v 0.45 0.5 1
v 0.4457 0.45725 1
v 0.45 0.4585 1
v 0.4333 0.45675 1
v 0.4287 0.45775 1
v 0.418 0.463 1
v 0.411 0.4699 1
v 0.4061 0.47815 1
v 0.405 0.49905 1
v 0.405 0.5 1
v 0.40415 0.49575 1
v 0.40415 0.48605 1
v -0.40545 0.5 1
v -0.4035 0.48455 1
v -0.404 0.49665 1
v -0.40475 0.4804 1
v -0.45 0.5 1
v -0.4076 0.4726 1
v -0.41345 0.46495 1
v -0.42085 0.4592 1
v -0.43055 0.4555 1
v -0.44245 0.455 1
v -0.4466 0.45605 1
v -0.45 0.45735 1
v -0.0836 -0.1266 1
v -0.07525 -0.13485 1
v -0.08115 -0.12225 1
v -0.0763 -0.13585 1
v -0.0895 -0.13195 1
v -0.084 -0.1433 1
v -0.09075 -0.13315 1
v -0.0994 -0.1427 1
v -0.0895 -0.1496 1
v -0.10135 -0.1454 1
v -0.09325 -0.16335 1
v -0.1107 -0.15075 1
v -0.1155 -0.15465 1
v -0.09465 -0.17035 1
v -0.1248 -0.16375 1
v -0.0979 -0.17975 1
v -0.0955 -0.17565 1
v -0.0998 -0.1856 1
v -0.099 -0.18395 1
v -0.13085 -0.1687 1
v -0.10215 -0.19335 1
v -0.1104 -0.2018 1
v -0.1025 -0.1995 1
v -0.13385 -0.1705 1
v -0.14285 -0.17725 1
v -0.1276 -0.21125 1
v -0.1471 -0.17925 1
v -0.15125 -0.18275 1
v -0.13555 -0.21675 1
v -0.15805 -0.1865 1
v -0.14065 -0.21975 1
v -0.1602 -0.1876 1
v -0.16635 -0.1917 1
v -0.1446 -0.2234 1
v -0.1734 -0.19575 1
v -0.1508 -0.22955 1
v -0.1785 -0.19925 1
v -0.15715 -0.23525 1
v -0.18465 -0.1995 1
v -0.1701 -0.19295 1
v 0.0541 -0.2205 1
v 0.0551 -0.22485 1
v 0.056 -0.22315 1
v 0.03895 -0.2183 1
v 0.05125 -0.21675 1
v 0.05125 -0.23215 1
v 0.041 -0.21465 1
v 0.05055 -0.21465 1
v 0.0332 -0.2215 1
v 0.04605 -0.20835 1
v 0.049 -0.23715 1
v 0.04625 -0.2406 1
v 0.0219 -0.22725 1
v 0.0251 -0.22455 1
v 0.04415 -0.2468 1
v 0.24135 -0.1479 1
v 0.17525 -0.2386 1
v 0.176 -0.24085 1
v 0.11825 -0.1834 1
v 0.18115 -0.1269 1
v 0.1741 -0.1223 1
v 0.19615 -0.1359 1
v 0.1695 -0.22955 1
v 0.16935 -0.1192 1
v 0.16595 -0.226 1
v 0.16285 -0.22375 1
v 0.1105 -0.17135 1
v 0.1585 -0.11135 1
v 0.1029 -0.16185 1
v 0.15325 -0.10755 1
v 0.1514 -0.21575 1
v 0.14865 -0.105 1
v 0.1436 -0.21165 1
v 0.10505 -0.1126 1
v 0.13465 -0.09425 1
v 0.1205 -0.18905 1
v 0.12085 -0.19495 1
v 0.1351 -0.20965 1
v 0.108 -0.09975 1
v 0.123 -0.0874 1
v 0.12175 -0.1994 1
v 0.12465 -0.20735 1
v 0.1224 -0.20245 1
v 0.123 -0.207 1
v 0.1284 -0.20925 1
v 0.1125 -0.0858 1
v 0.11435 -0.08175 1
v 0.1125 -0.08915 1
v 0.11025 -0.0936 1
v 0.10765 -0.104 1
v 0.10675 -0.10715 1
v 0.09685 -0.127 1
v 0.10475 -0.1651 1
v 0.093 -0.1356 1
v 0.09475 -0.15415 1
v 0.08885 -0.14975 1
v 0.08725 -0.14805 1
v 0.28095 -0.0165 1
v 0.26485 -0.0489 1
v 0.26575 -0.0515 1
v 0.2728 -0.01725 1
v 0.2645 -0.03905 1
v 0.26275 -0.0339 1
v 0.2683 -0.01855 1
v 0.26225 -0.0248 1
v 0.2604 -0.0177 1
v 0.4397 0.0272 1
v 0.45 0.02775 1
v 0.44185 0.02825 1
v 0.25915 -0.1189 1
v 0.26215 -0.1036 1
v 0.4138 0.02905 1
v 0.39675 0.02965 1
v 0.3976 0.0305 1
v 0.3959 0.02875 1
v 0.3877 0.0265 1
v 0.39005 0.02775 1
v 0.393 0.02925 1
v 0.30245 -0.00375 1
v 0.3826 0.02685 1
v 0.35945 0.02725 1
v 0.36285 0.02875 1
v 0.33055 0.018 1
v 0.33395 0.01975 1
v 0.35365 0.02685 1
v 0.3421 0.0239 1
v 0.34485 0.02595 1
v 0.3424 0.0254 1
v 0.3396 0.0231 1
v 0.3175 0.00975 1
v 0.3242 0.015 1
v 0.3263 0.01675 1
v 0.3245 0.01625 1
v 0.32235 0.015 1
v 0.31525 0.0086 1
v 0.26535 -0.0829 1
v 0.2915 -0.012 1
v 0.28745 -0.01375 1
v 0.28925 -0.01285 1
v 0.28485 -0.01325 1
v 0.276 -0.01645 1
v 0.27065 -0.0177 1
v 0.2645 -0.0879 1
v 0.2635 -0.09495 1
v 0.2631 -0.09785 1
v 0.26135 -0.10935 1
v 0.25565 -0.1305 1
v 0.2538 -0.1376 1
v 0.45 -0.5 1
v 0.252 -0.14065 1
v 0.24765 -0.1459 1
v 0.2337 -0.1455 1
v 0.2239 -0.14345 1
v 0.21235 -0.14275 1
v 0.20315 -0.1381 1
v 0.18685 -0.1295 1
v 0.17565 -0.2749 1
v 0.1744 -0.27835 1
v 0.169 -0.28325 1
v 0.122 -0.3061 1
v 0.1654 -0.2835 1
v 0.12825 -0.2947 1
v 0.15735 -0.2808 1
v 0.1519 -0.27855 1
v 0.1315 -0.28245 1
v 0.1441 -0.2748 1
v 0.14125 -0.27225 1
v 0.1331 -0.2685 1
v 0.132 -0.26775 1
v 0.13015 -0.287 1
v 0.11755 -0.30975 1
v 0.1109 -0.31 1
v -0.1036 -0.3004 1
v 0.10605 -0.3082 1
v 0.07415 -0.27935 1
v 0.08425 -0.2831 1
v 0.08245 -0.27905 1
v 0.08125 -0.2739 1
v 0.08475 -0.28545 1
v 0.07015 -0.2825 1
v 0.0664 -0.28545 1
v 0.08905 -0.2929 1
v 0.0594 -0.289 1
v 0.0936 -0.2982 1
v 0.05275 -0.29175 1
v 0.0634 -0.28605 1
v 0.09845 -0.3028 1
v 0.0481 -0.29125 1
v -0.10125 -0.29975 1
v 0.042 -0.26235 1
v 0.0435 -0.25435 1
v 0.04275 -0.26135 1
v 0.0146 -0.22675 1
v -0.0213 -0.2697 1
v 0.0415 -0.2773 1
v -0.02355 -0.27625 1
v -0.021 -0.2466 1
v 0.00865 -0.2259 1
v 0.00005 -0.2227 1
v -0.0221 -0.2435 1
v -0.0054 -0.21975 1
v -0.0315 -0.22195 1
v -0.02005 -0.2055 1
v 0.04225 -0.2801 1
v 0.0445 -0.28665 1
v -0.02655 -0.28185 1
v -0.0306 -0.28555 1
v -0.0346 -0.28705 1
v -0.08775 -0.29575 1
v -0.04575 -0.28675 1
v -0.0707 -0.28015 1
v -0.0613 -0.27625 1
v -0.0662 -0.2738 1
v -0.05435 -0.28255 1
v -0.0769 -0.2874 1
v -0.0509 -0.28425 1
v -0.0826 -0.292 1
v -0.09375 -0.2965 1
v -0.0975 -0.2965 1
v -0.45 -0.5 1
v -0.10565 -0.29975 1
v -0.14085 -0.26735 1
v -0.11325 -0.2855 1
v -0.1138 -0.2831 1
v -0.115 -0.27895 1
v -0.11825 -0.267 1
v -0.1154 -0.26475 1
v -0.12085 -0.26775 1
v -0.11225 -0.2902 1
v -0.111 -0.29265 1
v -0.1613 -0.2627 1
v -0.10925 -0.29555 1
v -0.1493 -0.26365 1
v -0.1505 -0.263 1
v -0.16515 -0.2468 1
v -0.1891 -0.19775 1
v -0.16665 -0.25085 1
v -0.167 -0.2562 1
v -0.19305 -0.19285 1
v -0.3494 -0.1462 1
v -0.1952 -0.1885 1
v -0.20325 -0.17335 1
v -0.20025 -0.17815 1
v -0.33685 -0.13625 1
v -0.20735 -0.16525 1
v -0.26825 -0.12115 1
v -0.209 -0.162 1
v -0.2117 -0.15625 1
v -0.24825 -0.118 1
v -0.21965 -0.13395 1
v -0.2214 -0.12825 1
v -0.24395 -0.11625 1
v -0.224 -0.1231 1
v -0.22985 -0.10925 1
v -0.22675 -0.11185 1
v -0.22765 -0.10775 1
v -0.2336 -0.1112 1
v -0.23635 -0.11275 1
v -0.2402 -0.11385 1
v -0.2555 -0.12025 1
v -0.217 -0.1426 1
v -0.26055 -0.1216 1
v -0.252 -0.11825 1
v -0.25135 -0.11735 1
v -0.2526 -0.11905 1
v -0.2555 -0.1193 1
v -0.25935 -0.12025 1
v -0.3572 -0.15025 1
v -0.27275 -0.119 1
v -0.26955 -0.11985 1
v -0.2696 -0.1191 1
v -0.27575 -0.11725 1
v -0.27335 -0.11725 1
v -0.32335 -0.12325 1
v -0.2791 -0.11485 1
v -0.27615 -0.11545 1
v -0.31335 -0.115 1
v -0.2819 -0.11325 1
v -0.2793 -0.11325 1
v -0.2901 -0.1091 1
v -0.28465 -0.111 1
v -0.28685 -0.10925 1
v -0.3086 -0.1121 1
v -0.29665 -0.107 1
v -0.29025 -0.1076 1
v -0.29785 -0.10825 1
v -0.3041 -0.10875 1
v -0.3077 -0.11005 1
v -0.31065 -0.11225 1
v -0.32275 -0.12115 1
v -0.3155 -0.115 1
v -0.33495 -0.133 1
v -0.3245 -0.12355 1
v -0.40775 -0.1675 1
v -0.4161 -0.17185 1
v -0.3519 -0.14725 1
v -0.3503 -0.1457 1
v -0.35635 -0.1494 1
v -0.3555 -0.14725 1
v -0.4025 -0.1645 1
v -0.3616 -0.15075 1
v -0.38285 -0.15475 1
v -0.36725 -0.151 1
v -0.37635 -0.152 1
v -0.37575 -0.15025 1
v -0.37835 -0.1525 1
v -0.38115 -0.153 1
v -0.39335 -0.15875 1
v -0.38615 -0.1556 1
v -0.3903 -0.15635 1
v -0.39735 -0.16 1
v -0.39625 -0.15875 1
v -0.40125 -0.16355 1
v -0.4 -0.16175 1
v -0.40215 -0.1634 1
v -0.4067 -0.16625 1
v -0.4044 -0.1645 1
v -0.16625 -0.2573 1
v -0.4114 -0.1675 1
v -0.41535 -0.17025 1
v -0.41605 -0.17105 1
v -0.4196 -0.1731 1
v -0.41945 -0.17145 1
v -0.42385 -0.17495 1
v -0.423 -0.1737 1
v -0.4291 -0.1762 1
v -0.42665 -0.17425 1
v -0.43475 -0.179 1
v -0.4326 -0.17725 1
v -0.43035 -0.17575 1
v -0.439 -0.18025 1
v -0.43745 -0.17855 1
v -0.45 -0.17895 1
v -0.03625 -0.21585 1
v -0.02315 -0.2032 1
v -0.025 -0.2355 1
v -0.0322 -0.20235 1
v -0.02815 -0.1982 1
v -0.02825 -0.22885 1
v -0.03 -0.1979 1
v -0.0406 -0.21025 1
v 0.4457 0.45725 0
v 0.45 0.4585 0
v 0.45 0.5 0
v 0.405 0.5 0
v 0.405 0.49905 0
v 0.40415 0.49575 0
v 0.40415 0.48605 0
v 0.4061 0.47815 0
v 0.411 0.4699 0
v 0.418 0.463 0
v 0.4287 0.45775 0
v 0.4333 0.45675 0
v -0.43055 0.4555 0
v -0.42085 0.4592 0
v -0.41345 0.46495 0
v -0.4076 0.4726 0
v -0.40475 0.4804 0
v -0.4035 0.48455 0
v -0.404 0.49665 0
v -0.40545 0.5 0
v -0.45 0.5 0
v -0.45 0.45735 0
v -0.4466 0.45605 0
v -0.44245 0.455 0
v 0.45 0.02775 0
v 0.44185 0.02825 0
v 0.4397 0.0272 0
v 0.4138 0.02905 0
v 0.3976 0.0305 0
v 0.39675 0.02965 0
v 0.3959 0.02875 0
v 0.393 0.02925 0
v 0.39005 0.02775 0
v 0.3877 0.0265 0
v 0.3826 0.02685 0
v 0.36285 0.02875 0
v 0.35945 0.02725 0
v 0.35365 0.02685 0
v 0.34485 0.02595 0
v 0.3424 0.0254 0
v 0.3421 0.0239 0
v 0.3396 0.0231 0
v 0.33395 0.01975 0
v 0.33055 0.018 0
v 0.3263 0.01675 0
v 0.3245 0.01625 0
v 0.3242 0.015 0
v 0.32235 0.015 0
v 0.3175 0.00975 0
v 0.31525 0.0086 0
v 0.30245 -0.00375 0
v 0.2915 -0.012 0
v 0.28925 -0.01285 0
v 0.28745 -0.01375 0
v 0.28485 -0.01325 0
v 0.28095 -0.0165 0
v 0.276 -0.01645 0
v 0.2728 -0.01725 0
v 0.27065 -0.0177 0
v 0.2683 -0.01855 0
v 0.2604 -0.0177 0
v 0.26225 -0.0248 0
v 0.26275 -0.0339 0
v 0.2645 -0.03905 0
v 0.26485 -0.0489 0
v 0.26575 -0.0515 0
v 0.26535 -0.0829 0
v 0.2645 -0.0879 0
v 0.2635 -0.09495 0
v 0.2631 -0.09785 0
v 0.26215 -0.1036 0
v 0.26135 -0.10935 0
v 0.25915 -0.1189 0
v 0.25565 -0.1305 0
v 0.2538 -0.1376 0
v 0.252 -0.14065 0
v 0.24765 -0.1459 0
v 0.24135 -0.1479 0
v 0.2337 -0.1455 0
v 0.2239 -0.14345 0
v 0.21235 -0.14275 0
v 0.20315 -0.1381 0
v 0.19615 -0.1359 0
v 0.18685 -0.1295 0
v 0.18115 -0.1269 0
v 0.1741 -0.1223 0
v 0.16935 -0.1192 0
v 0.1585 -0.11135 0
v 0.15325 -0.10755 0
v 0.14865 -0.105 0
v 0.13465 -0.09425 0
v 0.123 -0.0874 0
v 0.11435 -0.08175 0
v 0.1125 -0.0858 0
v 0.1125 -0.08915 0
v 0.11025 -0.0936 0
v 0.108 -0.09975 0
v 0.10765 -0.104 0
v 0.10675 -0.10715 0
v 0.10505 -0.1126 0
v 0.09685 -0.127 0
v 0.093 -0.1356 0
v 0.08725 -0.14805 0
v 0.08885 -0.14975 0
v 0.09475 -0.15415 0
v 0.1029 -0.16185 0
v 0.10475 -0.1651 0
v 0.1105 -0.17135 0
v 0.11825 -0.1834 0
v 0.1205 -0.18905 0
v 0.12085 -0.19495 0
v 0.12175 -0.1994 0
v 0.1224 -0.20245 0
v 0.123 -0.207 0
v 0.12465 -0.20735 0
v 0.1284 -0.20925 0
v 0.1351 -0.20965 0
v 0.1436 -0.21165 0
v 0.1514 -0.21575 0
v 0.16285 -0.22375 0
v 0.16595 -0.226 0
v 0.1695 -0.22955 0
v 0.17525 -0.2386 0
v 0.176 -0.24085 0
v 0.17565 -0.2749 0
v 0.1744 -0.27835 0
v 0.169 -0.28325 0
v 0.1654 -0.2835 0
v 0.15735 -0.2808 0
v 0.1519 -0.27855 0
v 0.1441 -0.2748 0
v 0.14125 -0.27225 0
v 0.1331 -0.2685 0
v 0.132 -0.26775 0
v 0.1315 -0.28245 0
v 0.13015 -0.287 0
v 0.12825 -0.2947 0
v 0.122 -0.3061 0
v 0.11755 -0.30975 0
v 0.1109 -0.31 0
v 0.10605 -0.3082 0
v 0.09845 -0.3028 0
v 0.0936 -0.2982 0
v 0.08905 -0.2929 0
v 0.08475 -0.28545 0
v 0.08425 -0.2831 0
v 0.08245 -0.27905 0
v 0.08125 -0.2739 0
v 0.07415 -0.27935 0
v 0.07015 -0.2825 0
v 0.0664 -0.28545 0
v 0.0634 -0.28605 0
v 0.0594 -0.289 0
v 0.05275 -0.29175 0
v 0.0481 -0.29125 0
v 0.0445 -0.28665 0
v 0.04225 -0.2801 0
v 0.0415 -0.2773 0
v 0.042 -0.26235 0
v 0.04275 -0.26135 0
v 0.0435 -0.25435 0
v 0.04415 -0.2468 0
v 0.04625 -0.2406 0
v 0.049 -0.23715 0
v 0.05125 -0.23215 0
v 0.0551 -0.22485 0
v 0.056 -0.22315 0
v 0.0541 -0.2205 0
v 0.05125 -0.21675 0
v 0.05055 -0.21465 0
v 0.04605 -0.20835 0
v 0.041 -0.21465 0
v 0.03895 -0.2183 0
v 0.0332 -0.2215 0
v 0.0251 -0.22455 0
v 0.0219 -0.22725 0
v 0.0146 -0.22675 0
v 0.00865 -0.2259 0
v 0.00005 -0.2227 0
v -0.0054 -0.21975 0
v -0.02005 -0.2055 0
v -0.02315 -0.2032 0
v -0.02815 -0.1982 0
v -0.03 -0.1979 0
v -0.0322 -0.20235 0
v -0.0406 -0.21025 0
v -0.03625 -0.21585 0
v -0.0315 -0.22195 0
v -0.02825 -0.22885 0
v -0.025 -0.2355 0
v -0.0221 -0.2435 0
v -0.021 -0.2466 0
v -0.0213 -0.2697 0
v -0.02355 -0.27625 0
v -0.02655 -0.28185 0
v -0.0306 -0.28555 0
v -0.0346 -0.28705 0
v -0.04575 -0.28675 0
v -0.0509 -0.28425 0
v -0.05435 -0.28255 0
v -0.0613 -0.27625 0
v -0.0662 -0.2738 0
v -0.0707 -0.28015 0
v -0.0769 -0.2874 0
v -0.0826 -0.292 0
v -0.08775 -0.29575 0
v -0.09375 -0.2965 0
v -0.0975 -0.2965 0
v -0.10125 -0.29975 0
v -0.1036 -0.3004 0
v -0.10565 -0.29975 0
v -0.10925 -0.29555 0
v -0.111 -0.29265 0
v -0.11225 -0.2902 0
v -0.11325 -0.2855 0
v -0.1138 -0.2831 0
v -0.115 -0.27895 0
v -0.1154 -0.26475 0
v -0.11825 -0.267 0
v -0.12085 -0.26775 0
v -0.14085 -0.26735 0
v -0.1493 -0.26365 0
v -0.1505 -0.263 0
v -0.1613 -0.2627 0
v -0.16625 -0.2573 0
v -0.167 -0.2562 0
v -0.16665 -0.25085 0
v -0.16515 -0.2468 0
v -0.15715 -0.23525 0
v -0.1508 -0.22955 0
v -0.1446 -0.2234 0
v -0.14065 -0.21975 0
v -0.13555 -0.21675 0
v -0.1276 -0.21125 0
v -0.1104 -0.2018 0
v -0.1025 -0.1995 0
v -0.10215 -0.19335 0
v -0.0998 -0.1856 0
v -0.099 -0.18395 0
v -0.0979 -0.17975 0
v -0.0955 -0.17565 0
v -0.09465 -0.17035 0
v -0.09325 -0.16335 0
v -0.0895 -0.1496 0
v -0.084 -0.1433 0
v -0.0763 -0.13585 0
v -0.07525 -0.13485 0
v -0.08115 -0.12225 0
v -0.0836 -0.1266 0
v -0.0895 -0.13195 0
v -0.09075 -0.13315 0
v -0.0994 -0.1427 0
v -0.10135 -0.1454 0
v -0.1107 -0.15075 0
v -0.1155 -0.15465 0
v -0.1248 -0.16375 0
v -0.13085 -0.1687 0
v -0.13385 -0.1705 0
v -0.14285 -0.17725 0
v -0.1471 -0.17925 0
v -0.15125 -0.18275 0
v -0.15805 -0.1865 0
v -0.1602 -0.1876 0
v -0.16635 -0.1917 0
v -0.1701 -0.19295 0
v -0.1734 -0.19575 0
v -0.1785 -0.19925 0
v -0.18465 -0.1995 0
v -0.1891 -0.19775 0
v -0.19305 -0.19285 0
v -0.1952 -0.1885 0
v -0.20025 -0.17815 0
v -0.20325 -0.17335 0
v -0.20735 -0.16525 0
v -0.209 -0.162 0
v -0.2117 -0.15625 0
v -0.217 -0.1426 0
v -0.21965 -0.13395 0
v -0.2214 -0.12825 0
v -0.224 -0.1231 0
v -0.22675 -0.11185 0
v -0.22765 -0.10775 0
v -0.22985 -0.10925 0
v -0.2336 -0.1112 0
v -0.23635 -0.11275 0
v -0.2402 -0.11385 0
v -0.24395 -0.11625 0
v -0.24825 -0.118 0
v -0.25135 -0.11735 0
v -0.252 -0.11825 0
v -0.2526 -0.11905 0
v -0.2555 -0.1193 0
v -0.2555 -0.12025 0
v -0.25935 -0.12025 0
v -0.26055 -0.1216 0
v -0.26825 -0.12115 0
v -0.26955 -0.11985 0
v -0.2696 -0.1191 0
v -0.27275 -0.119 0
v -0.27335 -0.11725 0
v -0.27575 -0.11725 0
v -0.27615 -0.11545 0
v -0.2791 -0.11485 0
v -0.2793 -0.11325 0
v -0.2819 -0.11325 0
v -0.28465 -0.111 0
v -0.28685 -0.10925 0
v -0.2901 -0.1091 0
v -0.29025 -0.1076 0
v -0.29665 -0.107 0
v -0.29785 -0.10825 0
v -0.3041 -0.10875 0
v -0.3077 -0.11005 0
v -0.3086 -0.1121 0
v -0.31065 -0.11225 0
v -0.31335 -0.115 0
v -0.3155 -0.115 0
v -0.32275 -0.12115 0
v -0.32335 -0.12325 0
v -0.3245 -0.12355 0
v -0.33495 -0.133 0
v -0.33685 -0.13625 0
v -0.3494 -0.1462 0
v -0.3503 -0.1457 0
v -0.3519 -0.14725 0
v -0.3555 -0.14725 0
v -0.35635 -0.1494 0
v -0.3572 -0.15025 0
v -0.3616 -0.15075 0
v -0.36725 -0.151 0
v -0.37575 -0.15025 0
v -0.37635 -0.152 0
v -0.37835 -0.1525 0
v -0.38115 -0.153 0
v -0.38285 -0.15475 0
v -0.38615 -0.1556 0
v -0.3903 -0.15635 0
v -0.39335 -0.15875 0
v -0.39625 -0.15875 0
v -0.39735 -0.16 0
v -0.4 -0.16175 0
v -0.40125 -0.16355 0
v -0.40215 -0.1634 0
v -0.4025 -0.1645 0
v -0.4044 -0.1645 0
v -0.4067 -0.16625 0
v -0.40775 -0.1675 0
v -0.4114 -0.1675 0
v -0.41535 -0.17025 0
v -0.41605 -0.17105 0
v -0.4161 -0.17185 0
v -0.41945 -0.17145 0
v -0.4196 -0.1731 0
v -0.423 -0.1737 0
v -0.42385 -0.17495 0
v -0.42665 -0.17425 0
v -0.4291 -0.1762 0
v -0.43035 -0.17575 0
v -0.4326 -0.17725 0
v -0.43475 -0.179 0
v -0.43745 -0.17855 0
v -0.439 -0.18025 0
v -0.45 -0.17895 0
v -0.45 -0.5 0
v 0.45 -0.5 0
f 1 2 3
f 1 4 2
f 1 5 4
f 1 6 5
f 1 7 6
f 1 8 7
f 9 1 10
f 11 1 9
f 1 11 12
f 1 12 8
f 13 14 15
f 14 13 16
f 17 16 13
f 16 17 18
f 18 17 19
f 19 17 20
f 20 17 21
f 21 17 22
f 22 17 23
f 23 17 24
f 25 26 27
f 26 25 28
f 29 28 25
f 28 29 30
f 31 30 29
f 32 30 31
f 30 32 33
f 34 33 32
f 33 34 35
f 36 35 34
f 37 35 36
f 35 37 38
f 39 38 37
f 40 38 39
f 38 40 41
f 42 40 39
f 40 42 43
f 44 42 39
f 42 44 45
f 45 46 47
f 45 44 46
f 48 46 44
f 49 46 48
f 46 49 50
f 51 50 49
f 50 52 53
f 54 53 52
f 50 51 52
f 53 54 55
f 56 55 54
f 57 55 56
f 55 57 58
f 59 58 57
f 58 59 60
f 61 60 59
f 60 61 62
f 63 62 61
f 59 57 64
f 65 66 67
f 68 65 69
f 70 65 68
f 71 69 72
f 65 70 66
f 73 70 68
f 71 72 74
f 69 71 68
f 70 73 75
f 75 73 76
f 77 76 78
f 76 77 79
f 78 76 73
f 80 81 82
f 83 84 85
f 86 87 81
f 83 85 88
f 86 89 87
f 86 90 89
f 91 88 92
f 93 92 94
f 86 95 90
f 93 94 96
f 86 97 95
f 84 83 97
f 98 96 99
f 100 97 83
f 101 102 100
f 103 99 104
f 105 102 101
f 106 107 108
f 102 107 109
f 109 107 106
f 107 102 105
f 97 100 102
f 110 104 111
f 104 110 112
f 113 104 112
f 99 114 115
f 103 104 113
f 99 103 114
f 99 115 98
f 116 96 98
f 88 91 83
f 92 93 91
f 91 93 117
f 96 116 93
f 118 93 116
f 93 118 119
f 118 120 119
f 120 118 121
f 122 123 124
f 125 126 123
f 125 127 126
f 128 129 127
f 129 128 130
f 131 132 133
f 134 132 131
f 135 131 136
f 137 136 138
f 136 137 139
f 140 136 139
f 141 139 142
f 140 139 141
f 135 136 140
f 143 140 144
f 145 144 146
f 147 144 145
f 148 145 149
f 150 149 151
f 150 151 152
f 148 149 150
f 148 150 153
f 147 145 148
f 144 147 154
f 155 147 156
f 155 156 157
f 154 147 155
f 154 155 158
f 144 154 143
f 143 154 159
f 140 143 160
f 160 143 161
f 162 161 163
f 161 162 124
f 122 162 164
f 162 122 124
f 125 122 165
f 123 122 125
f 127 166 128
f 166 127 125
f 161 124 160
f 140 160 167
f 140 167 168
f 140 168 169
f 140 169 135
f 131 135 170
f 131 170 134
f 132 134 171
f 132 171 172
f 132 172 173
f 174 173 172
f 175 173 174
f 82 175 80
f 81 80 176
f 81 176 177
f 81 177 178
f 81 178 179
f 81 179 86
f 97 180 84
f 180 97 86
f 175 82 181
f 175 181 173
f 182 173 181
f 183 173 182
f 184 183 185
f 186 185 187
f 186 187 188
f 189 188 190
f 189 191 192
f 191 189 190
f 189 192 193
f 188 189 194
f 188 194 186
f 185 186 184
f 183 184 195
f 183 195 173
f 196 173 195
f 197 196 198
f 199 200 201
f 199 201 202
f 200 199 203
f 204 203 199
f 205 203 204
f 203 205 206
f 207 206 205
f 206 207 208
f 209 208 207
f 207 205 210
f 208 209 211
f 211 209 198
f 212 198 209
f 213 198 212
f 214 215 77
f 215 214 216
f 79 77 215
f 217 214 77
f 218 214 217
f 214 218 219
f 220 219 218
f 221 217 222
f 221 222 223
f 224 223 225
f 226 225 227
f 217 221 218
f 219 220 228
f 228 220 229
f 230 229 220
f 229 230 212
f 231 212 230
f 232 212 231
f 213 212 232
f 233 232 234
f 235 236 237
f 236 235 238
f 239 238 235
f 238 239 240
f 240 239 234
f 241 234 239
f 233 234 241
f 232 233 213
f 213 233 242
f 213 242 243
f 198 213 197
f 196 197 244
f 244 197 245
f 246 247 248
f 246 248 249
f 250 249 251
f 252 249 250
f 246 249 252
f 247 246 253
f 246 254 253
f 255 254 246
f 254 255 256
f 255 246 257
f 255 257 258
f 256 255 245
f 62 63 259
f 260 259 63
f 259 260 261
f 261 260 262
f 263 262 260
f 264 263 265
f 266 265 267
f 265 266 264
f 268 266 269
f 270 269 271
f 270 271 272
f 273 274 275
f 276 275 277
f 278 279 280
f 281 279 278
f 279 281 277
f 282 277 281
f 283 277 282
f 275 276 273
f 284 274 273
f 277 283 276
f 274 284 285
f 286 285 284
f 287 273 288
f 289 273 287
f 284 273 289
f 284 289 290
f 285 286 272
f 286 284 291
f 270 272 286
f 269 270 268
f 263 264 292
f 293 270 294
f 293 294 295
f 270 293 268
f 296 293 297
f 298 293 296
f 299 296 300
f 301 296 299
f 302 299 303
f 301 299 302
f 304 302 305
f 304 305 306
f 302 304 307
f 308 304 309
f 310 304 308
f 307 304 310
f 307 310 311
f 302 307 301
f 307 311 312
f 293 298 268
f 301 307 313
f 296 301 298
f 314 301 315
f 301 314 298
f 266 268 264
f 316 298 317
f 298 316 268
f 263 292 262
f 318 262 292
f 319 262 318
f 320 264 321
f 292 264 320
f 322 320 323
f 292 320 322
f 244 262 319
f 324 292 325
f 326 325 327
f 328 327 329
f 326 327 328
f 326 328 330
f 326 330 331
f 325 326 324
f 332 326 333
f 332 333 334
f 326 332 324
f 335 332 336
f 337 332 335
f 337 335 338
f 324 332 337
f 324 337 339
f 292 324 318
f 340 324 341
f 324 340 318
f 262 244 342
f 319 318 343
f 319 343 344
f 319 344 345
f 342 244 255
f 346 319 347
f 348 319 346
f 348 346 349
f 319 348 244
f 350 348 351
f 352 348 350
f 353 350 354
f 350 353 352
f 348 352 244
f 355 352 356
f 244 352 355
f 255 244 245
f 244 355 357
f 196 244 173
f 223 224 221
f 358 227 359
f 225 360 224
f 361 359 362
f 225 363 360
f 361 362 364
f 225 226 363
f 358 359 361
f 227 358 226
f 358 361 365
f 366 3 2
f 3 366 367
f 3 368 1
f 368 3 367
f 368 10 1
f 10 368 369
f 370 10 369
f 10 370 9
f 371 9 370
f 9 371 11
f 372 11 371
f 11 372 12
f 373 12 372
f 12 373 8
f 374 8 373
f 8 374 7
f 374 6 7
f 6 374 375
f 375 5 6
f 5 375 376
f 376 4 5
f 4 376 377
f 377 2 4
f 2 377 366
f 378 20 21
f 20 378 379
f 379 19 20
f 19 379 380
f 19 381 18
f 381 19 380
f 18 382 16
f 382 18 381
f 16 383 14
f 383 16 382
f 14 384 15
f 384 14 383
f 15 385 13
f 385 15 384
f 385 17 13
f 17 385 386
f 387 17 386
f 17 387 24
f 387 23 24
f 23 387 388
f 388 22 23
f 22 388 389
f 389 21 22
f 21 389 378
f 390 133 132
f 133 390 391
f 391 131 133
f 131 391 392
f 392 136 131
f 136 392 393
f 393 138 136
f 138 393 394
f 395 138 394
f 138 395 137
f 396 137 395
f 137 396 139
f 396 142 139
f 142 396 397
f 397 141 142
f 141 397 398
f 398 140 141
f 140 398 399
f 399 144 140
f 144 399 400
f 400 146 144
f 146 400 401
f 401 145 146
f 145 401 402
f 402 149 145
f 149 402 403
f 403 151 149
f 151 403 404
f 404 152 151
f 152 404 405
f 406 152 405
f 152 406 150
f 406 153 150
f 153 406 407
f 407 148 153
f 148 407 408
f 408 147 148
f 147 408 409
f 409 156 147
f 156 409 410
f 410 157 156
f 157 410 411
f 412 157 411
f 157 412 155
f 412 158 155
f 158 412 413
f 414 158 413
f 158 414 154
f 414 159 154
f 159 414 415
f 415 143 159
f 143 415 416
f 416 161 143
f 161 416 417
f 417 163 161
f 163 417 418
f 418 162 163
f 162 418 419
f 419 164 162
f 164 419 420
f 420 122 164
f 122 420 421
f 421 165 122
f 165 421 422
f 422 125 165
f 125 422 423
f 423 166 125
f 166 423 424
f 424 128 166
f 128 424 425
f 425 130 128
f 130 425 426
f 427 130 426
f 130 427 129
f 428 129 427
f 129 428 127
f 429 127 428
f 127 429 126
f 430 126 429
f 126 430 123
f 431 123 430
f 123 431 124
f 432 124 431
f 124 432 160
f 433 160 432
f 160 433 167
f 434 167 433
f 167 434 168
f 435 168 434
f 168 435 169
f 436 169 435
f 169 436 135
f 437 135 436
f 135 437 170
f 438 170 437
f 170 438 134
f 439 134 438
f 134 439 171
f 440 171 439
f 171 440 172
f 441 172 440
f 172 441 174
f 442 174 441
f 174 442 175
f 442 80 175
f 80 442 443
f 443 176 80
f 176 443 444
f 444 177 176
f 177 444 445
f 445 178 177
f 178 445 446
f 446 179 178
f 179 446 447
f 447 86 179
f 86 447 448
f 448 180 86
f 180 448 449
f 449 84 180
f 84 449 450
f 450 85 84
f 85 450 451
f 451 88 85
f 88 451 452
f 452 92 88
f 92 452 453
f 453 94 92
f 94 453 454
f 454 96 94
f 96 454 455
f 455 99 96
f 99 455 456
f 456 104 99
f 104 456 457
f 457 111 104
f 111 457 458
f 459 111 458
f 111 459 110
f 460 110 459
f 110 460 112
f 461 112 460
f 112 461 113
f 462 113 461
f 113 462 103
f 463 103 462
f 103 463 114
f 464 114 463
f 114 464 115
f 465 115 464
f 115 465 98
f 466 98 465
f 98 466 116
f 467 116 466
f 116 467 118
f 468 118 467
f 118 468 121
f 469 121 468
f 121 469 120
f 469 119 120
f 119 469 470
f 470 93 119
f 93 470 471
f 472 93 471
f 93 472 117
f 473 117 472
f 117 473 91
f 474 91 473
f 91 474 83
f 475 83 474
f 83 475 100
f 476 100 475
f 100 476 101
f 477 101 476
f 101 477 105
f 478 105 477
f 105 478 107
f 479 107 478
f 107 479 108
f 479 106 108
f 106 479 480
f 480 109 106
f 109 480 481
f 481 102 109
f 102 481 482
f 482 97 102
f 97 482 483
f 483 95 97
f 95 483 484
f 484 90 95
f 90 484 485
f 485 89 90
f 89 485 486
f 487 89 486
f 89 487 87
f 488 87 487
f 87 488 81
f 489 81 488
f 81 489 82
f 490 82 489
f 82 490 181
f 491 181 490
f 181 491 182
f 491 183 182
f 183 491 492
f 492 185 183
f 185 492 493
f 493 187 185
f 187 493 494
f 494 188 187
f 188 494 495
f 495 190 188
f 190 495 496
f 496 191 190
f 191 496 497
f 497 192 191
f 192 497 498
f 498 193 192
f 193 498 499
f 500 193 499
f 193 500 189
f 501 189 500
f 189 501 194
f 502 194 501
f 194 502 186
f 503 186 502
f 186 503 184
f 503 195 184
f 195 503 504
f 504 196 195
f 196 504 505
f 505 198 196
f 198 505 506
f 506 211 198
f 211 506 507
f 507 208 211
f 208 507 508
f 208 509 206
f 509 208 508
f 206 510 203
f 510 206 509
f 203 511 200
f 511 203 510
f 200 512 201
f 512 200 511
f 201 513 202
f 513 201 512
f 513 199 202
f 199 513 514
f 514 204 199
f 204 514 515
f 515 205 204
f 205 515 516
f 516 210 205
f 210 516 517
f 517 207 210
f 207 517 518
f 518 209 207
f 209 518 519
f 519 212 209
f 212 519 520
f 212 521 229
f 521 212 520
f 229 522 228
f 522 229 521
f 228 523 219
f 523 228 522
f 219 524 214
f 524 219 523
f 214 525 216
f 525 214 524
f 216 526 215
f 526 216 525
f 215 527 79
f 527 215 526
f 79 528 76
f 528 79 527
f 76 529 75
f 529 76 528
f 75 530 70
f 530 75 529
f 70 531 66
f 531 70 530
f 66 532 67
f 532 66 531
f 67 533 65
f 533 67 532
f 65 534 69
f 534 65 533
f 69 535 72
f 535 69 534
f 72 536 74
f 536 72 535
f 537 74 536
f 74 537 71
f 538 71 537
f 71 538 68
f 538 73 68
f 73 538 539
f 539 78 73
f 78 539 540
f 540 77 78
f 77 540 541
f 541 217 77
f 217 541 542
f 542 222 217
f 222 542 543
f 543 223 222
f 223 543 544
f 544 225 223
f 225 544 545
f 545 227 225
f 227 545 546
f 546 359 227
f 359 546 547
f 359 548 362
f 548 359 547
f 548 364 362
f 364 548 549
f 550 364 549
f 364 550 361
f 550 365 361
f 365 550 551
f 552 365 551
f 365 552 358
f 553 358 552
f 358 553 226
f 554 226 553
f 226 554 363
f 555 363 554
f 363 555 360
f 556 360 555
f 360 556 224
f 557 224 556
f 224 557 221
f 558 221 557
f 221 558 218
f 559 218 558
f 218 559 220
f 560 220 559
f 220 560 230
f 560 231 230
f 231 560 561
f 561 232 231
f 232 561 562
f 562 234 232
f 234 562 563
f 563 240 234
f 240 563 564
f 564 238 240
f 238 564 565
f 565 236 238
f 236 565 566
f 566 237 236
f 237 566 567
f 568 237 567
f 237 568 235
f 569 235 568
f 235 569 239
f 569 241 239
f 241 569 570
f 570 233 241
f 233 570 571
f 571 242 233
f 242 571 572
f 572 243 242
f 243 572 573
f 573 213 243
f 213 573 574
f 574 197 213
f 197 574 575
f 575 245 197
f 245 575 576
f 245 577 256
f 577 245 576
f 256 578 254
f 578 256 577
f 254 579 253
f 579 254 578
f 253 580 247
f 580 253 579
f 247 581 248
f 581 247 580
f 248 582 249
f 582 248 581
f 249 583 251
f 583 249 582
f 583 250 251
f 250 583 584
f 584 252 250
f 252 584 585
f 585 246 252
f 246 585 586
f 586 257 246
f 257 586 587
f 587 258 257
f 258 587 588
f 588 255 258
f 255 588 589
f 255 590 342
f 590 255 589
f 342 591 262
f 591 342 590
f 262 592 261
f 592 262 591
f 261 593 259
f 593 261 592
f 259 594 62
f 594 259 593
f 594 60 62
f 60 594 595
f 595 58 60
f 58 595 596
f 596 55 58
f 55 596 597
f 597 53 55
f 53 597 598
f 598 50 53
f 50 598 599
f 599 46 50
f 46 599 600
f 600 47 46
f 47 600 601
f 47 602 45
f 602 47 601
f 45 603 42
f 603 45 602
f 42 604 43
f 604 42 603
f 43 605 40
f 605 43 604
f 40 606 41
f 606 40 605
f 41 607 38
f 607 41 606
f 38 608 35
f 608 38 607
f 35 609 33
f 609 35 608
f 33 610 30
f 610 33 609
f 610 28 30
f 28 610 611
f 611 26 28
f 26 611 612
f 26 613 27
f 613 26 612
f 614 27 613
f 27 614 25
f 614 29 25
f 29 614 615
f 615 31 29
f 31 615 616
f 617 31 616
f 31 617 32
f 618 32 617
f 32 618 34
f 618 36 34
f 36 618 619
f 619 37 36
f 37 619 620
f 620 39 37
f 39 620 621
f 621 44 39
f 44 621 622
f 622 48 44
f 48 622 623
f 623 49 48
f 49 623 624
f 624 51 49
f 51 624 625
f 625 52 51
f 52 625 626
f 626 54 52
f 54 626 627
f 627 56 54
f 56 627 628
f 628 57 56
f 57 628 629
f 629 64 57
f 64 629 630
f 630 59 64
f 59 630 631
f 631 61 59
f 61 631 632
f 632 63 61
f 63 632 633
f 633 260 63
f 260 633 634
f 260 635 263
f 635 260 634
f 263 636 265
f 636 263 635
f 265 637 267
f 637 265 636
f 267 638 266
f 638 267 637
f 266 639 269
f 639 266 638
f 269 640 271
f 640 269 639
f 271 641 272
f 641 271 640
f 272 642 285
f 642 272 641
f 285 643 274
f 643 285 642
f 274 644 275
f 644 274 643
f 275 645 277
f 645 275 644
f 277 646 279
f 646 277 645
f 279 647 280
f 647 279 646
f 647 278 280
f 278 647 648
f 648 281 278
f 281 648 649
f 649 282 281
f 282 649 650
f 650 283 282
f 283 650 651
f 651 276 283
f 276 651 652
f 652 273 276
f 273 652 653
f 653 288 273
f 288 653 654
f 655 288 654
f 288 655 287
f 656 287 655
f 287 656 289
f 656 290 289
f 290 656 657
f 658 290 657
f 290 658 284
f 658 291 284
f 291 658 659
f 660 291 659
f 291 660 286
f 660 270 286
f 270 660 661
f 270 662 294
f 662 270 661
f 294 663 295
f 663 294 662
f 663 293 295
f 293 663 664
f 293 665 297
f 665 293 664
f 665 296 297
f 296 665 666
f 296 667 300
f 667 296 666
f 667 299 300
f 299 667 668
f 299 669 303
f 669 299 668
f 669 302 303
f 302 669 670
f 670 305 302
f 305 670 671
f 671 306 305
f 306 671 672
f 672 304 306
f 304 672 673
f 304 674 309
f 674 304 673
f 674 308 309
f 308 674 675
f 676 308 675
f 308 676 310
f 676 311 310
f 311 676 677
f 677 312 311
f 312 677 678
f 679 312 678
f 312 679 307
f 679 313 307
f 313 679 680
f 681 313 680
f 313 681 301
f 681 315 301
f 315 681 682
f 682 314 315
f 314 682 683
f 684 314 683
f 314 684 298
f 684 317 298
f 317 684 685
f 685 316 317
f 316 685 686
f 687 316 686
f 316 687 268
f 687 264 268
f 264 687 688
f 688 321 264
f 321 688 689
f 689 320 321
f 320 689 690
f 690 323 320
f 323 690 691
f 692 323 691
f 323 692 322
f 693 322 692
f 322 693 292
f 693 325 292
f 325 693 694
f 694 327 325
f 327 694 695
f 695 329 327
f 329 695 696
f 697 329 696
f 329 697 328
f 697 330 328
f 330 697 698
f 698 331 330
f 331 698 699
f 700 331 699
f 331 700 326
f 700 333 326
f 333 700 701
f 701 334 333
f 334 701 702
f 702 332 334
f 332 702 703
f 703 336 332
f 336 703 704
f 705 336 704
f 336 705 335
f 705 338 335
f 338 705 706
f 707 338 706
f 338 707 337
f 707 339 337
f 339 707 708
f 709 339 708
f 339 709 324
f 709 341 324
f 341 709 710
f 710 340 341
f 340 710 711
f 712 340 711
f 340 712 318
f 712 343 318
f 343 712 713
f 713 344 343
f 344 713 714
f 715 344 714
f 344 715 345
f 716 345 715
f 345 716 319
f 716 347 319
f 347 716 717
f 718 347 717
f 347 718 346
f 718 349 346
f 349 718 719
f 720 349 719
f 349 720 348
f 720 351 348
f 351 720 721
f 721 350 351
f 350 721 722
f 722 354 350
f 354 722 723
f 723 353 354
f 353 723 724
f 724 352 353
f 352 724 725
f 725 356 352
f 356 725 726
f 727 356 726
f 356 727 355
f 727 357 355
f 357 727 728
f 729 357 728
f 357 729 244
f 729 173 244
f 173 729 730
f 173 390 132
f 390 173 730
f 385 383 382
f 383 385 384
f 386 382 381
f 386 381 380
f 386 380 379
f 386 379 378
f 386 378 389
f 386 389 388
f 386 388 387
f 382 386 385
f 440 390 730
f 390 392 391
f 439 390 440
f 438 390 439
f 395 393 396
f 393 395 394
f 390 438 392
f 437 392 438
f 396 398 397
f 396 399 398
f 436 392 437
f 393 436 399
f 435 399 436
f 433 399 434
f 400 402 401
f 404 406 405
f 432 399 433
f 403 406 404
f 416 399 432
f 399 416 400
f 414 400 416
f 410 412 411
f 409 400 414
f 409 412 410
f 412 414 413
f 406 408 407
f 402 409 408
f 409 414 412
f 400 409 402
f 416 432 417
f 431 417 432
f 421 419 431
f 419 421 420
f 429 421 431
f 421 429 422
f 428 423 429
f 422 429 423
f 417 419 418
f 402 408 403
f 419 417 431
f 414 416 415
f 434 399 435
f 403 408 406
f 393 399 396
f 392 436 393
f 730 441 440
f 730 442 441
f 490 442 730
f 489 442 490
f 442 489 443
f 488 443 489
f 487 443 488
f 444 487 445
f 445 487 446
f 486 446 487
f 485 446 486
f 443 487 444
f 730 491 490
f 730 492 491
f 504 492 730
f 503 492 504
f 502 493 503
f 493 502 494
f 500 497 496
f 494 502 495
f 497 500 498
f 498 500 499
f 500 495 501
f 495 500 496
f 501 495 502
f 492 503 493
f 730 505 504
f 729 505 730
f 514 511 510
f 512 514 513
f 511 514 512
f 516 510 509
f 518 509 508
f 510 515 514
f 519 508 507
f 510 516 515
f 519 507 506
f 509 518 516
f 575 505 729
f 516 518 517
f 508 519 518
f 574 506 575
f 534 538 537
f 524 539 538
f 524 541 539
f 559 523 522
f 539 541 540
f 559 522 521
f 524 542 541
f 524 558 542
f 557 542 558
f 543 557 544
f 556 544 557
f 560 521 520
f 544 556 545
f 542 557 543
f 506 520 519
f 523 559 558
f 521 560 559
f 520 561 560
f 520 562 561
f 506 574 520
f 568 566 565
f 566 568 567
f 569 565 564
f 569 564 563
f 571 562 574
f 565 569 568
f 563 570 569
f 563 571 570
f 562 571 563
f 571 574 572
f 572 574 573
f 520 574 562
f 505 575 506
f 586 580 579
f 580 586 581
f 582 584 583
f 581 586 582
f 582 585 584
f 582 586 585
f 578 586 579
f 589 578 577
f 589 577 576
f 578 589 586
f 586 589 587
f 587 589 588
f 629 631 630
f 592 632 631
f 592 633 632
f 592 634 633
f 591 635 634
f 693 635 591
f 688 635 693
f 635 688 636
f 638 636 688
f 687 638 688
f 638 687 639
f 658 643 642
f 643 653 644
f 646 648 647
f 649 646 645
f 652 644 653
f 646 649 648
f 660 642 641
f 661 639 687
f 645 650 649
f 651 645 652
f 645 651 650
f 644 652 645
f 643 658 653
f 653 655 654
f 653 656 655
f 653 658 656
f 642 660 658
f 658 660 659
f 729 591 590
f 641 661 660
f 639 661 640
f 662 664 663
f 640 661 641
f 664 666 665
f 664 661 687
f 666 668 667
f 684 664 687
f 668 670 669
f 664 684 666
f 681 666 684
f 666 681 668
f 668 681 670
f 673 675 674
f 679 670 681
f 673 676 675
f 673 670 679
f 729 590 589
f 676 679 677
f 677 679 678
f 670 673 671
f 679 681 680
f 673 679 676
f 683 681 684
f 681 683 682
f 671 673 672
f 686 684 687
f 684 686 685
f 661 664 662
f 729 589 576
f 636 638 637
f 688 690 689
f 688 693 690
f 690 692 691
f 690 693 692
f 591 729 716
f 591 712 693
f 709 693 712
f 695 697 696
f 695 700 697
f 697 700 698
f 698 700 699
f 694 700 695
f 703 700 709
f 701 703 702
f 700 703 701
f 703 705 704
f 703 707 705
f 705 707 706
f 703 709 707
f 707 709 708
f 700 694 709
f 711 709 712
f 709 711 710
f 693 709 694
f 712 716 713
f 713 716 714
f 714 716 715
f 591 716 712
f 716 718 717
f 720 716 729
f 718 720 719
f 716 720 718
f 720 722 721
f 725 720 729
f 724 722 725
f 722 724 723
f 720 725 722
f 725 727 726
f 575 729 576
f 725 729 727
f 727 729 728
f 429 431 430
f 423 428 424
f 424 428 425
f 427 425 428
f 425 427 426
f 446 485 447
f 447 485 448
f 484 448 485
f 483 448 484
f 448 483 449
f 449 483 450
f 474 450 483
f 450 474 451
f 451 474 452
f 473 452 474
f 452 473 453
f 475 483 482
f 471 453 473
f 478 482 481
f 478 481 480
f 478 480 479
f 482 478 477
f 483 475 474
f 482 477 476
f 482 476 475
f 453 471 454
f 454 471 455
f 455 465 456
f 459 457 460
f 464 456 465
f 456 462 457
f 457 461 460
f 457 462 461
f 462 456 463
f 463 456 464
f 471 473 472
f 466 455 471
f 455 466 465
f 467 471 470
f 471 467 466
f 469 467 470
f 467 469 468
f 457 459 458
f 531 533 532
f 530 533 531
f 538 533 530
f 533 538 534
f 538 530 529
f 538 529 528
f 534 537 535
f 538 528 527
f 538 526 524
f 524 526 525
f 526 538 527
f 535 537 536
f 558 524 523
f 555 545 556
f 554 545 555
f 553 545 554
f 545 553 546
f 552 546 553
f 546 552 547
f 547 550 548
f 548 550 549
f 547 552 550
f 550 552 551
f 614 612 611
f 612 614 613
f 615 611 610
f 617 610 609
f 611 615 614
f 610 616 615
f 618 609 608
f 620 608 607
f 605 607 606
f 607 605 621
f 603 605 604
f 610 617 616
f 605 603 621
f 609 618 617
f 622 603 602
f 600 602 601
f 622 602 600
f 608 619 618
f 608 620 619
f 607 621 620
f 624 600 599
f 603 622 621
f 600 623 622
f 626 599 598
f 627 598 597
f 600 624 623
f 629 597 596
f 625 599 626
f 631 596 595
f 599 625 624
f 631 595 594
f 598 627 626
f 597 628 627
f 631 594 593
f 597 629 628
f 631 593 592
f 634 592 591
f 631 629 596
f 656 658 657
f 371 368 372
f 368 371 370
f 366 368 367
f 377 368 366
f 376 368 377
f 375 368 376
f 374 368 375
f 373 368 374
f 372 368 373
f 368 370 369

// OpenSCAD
module h1green_1()
{
 /* Generated by trace2scad version 20150415
    http://aggregate.org/MAKE/TRACE2SCAD/
    Optimized model has 367/2241 original points
 */
 color([0.5, 0.5, 0.5])
 assign(minx=0) /* polygon minx=0 */
 assign(miny=0) /* polygon miny=0 */
 assign(maxx=18000) /* polygon maxx=18000 */
 assign(maxy=20000) /* polygon maxy=20000 */
 assign(dx=maxx-minx)
 assign(dy=maxy-miny)
 assign(maxd=((dx>dy)?dx:dy))
 scale([1/maxd, 1/maxd, 1])
 translate([-minx-dx/2, -miny-dy/2, 0])
 linear_extrude(height=1, convexity=367)
 union() {
  union() {
   polygon([[0,19573],[0,19147],[68,19121],[151,19100],[389,19110],[583,19184],[731,19299],[848,19452],[905,19608],[930,19691],[920,19933],[891,20000],[0,20000]], convexity=5);
   polygon([[17100,19990],[17100,19981],[17083,19915],[17083,19721],[17122,19563],[17220,19398],[17360,19260],[17574,19155],[17666,19135],[17914,19145],[18000,19170],[18000,20000],[17100,20000]], convexity=7);
   polygon([[16935,10593],[16918,10575],[16860,10585],[16801,10555],[16754,10530],[16652,10537],[16257,10575],[16189,10545],[16073,10537],[15897,10519],[15848,10508],[15842,10478],[15792,10462],[15679,10395],[15611,10360],[15526,10335],[15490,10325],[15484,10300],[15447,10300],[15350,10195],[15305,10172],[15049,9925],[14830,9760],[14785,9743],[14749,9725],[14697,9735],[14619,9670],[14520,9671],[14456,9655],[14413,9646],[14366,9629],[14208,9646],[14245,9504],[14255,9322],[14290,9219],[14297,9022],[14315,8970],[14307,8342],[14290,8242],[14270,8101],[14262,8043],[14243,7928],[14227,7813],[14183,7622],[14113,7390],[14076,7248],[14040,7187],[13953,7082],[13827,7042],[13674,7090],[13478,7131],[13247,7145],[13063,7238],[12923,7282],[12737,7410],[12623,7462],[12482,7554],[12387,7616],[12170,7773],[12065,7849],[11973,7900],[11693,8115],[11460,8252],[11287,8365],[11250,8284],[11250,8217],[11205,8128],[11160,8005],[11153,7920],[11135,7857],[11101,7748],[10937,7460],[10860,7288],[10745,7039],[10777,7005],[10895,6917],[11058,6763],[11095,6698],[11210,6573],[11365,6332],[11410,6219],[11417,6101],[11435,6012],[11448,5951],[11460,5860],[11493,5853],[11568,5815],[11702,5807],[11872,5767],[12028,5685],[12257,5525],[12319,5480],[12390,5409],[12505,5228],[12520,5183],[12513,4502],[12488,4433],[12380,4335],[12308,4330],[12147,4384],[12038,4429],[11882,4504],[11825,4555],[11662,4630],[11640,4645],[11630,4351],[11603,4260],[11565,4106],[11440,3878],[11351,3805],[11218,3800],[11121,3836],[10969,3944],[10872,4036],[10781,4142],[10695,4291],[10685,4338],[10649,4419],[10625,4522],[10483,4413],[10403,4350],[10328,4291],[10268,4279],[10188,4220],[10055,4165],[9962,4175],[9890,4267],[9845,4398],[9830,4454],[9840,4753],[9855,4773],[9870,4913],[9883,5064],[9925,5188],[9980,5257],[10025,5357],[10102,5503],[10120,5537],[10082,5590],[10025,5665],[10011,5707],[9921,5833],[9820,5707],[9779,5634],[9664,5570],[9502,5509],[9438,5455],[9292,5465],[9173,5482],[9001,5546],[8892,5605],[8599,5890],[8537,5936],[8437,6036],[8400,6042],[8356,5953],[8188,5795],[8275,5683],[8370,5561],[8435,5423],[8500,5290],[8558,5130],[8580,5068],[8574,4606],[8529,4475],[8469,4363],[8388,4289],[8308,4259],[8085,4265],[7982,4315],[7913,4349],[7774,4475],[7676,4524],[7586,4397],[7462,4252],[7348,4160],[7245,4085],[7125,4070],[7050,4070],[6975,4005],[6928,3992],[6887,4005],[6815,4089],[6780,4147],[6755,4196],[6735,4290],[6724,4338],[6700,4421],[6692,4705],[6635,4660],[6583,4645],[6183,4653],[6014,4727],[5990,4740],[5774,4746],[5675,4854],[5660,4876],[5667,4983],[5697,5064],[5857,5295],[5984,5409],[6108,5532],[6187,5605],[6289,5665],[6448,5775],[6792,5964],[6950,6010],[6957,6133],[7004,6288],[7020,6321],[7042,6405],[7090,6487],[7107,6593],[7135,6733],[7210,7008],[7320,7134],[7474,7283],[7495,7303],[7377,7555],[7328,7468],[7210,7361],[7185,7337],[7012,7146],[6973,7092],[6786,6985],[6690,6907],[6504,6725],[6383,6626],[6323,6590],[6143,6455],[6058,6415],[5975,6345],[5839,6270],[5796,6248],[5673,6166],[5598,6141],[5532,6085],[5430,6015],[5307,6010],[5218,6045],[5139,6143],[5096,6230],[4995,6437],[4935,6533],[4853,6695],[4820,6760],[4766,6875],[4660,7148],[4607,7321],[4572,7435],[4520,7538],[4465,7763],[4447,7845],[4403,7815],[4328,7776],[4273,7745],[4196,7723],[4121,7675],[4035,7640],[3973,7653],[3960,7635],[3948,7619],[3890,7614],[3890,7595],[3813,7595],[3789,7568],[3635,7577],[3609,7603],[3608,7618],[3545,7620],[3533,7655],[3485,7655],[3477,7691],[3418,7703],[3414,7735],[3362,7735],[3307,7780],[3263,7815],[3198,7818],[3195,7848],[3067,7860],[3043,7835],[2918,7825],[2846,7799],[2828,7758],[2787,7755],[2733,7700],[2690,7700],[2545,7577],[2533,7535],[2510,7529],[2301,7340],[2263,7275],[2012,7076],[1994,7086],[1962,7055],[1890,7055],[1873,7012],[1856,6995],[1768,6985],[1655,6980],[1485,6995],[1473,6960],[1433,6950],[1377,6940],[1343,6905],[1277,6888],[1194,6873],[1133,6825],[1075,6825],[1053,6800],[1000,6765],[975,6729],[957,6732],[950,6710],[912,6710],[866,6675],[845,6650],[772,6650],[693,6595],[679,6579],[678,6563],[611,6571],[608,6538],[540,6526],[523,6501],[467,6515],[418,6476],[393,6485],[348,6455],[305,6420],[251,6429],[220,6395],[0,6421],[0,0],[18000,0],[18000,10555],[17837,10565],[17794,10544],[17276,10581],[16952,10610]], convexity=83);
  }
 }
}

module h1green()
{
 /* all layers combined, scaled to within a 1mm cube */
 scale([1, 1, 1/1])
 difference() {
  union() {
   scale([1,1,2]) translate([0,0,-0.5]) h1green_1();
  }
  translate([0,0,-2]) cube([2,2,4],center=true);
 }
}
h1green();
